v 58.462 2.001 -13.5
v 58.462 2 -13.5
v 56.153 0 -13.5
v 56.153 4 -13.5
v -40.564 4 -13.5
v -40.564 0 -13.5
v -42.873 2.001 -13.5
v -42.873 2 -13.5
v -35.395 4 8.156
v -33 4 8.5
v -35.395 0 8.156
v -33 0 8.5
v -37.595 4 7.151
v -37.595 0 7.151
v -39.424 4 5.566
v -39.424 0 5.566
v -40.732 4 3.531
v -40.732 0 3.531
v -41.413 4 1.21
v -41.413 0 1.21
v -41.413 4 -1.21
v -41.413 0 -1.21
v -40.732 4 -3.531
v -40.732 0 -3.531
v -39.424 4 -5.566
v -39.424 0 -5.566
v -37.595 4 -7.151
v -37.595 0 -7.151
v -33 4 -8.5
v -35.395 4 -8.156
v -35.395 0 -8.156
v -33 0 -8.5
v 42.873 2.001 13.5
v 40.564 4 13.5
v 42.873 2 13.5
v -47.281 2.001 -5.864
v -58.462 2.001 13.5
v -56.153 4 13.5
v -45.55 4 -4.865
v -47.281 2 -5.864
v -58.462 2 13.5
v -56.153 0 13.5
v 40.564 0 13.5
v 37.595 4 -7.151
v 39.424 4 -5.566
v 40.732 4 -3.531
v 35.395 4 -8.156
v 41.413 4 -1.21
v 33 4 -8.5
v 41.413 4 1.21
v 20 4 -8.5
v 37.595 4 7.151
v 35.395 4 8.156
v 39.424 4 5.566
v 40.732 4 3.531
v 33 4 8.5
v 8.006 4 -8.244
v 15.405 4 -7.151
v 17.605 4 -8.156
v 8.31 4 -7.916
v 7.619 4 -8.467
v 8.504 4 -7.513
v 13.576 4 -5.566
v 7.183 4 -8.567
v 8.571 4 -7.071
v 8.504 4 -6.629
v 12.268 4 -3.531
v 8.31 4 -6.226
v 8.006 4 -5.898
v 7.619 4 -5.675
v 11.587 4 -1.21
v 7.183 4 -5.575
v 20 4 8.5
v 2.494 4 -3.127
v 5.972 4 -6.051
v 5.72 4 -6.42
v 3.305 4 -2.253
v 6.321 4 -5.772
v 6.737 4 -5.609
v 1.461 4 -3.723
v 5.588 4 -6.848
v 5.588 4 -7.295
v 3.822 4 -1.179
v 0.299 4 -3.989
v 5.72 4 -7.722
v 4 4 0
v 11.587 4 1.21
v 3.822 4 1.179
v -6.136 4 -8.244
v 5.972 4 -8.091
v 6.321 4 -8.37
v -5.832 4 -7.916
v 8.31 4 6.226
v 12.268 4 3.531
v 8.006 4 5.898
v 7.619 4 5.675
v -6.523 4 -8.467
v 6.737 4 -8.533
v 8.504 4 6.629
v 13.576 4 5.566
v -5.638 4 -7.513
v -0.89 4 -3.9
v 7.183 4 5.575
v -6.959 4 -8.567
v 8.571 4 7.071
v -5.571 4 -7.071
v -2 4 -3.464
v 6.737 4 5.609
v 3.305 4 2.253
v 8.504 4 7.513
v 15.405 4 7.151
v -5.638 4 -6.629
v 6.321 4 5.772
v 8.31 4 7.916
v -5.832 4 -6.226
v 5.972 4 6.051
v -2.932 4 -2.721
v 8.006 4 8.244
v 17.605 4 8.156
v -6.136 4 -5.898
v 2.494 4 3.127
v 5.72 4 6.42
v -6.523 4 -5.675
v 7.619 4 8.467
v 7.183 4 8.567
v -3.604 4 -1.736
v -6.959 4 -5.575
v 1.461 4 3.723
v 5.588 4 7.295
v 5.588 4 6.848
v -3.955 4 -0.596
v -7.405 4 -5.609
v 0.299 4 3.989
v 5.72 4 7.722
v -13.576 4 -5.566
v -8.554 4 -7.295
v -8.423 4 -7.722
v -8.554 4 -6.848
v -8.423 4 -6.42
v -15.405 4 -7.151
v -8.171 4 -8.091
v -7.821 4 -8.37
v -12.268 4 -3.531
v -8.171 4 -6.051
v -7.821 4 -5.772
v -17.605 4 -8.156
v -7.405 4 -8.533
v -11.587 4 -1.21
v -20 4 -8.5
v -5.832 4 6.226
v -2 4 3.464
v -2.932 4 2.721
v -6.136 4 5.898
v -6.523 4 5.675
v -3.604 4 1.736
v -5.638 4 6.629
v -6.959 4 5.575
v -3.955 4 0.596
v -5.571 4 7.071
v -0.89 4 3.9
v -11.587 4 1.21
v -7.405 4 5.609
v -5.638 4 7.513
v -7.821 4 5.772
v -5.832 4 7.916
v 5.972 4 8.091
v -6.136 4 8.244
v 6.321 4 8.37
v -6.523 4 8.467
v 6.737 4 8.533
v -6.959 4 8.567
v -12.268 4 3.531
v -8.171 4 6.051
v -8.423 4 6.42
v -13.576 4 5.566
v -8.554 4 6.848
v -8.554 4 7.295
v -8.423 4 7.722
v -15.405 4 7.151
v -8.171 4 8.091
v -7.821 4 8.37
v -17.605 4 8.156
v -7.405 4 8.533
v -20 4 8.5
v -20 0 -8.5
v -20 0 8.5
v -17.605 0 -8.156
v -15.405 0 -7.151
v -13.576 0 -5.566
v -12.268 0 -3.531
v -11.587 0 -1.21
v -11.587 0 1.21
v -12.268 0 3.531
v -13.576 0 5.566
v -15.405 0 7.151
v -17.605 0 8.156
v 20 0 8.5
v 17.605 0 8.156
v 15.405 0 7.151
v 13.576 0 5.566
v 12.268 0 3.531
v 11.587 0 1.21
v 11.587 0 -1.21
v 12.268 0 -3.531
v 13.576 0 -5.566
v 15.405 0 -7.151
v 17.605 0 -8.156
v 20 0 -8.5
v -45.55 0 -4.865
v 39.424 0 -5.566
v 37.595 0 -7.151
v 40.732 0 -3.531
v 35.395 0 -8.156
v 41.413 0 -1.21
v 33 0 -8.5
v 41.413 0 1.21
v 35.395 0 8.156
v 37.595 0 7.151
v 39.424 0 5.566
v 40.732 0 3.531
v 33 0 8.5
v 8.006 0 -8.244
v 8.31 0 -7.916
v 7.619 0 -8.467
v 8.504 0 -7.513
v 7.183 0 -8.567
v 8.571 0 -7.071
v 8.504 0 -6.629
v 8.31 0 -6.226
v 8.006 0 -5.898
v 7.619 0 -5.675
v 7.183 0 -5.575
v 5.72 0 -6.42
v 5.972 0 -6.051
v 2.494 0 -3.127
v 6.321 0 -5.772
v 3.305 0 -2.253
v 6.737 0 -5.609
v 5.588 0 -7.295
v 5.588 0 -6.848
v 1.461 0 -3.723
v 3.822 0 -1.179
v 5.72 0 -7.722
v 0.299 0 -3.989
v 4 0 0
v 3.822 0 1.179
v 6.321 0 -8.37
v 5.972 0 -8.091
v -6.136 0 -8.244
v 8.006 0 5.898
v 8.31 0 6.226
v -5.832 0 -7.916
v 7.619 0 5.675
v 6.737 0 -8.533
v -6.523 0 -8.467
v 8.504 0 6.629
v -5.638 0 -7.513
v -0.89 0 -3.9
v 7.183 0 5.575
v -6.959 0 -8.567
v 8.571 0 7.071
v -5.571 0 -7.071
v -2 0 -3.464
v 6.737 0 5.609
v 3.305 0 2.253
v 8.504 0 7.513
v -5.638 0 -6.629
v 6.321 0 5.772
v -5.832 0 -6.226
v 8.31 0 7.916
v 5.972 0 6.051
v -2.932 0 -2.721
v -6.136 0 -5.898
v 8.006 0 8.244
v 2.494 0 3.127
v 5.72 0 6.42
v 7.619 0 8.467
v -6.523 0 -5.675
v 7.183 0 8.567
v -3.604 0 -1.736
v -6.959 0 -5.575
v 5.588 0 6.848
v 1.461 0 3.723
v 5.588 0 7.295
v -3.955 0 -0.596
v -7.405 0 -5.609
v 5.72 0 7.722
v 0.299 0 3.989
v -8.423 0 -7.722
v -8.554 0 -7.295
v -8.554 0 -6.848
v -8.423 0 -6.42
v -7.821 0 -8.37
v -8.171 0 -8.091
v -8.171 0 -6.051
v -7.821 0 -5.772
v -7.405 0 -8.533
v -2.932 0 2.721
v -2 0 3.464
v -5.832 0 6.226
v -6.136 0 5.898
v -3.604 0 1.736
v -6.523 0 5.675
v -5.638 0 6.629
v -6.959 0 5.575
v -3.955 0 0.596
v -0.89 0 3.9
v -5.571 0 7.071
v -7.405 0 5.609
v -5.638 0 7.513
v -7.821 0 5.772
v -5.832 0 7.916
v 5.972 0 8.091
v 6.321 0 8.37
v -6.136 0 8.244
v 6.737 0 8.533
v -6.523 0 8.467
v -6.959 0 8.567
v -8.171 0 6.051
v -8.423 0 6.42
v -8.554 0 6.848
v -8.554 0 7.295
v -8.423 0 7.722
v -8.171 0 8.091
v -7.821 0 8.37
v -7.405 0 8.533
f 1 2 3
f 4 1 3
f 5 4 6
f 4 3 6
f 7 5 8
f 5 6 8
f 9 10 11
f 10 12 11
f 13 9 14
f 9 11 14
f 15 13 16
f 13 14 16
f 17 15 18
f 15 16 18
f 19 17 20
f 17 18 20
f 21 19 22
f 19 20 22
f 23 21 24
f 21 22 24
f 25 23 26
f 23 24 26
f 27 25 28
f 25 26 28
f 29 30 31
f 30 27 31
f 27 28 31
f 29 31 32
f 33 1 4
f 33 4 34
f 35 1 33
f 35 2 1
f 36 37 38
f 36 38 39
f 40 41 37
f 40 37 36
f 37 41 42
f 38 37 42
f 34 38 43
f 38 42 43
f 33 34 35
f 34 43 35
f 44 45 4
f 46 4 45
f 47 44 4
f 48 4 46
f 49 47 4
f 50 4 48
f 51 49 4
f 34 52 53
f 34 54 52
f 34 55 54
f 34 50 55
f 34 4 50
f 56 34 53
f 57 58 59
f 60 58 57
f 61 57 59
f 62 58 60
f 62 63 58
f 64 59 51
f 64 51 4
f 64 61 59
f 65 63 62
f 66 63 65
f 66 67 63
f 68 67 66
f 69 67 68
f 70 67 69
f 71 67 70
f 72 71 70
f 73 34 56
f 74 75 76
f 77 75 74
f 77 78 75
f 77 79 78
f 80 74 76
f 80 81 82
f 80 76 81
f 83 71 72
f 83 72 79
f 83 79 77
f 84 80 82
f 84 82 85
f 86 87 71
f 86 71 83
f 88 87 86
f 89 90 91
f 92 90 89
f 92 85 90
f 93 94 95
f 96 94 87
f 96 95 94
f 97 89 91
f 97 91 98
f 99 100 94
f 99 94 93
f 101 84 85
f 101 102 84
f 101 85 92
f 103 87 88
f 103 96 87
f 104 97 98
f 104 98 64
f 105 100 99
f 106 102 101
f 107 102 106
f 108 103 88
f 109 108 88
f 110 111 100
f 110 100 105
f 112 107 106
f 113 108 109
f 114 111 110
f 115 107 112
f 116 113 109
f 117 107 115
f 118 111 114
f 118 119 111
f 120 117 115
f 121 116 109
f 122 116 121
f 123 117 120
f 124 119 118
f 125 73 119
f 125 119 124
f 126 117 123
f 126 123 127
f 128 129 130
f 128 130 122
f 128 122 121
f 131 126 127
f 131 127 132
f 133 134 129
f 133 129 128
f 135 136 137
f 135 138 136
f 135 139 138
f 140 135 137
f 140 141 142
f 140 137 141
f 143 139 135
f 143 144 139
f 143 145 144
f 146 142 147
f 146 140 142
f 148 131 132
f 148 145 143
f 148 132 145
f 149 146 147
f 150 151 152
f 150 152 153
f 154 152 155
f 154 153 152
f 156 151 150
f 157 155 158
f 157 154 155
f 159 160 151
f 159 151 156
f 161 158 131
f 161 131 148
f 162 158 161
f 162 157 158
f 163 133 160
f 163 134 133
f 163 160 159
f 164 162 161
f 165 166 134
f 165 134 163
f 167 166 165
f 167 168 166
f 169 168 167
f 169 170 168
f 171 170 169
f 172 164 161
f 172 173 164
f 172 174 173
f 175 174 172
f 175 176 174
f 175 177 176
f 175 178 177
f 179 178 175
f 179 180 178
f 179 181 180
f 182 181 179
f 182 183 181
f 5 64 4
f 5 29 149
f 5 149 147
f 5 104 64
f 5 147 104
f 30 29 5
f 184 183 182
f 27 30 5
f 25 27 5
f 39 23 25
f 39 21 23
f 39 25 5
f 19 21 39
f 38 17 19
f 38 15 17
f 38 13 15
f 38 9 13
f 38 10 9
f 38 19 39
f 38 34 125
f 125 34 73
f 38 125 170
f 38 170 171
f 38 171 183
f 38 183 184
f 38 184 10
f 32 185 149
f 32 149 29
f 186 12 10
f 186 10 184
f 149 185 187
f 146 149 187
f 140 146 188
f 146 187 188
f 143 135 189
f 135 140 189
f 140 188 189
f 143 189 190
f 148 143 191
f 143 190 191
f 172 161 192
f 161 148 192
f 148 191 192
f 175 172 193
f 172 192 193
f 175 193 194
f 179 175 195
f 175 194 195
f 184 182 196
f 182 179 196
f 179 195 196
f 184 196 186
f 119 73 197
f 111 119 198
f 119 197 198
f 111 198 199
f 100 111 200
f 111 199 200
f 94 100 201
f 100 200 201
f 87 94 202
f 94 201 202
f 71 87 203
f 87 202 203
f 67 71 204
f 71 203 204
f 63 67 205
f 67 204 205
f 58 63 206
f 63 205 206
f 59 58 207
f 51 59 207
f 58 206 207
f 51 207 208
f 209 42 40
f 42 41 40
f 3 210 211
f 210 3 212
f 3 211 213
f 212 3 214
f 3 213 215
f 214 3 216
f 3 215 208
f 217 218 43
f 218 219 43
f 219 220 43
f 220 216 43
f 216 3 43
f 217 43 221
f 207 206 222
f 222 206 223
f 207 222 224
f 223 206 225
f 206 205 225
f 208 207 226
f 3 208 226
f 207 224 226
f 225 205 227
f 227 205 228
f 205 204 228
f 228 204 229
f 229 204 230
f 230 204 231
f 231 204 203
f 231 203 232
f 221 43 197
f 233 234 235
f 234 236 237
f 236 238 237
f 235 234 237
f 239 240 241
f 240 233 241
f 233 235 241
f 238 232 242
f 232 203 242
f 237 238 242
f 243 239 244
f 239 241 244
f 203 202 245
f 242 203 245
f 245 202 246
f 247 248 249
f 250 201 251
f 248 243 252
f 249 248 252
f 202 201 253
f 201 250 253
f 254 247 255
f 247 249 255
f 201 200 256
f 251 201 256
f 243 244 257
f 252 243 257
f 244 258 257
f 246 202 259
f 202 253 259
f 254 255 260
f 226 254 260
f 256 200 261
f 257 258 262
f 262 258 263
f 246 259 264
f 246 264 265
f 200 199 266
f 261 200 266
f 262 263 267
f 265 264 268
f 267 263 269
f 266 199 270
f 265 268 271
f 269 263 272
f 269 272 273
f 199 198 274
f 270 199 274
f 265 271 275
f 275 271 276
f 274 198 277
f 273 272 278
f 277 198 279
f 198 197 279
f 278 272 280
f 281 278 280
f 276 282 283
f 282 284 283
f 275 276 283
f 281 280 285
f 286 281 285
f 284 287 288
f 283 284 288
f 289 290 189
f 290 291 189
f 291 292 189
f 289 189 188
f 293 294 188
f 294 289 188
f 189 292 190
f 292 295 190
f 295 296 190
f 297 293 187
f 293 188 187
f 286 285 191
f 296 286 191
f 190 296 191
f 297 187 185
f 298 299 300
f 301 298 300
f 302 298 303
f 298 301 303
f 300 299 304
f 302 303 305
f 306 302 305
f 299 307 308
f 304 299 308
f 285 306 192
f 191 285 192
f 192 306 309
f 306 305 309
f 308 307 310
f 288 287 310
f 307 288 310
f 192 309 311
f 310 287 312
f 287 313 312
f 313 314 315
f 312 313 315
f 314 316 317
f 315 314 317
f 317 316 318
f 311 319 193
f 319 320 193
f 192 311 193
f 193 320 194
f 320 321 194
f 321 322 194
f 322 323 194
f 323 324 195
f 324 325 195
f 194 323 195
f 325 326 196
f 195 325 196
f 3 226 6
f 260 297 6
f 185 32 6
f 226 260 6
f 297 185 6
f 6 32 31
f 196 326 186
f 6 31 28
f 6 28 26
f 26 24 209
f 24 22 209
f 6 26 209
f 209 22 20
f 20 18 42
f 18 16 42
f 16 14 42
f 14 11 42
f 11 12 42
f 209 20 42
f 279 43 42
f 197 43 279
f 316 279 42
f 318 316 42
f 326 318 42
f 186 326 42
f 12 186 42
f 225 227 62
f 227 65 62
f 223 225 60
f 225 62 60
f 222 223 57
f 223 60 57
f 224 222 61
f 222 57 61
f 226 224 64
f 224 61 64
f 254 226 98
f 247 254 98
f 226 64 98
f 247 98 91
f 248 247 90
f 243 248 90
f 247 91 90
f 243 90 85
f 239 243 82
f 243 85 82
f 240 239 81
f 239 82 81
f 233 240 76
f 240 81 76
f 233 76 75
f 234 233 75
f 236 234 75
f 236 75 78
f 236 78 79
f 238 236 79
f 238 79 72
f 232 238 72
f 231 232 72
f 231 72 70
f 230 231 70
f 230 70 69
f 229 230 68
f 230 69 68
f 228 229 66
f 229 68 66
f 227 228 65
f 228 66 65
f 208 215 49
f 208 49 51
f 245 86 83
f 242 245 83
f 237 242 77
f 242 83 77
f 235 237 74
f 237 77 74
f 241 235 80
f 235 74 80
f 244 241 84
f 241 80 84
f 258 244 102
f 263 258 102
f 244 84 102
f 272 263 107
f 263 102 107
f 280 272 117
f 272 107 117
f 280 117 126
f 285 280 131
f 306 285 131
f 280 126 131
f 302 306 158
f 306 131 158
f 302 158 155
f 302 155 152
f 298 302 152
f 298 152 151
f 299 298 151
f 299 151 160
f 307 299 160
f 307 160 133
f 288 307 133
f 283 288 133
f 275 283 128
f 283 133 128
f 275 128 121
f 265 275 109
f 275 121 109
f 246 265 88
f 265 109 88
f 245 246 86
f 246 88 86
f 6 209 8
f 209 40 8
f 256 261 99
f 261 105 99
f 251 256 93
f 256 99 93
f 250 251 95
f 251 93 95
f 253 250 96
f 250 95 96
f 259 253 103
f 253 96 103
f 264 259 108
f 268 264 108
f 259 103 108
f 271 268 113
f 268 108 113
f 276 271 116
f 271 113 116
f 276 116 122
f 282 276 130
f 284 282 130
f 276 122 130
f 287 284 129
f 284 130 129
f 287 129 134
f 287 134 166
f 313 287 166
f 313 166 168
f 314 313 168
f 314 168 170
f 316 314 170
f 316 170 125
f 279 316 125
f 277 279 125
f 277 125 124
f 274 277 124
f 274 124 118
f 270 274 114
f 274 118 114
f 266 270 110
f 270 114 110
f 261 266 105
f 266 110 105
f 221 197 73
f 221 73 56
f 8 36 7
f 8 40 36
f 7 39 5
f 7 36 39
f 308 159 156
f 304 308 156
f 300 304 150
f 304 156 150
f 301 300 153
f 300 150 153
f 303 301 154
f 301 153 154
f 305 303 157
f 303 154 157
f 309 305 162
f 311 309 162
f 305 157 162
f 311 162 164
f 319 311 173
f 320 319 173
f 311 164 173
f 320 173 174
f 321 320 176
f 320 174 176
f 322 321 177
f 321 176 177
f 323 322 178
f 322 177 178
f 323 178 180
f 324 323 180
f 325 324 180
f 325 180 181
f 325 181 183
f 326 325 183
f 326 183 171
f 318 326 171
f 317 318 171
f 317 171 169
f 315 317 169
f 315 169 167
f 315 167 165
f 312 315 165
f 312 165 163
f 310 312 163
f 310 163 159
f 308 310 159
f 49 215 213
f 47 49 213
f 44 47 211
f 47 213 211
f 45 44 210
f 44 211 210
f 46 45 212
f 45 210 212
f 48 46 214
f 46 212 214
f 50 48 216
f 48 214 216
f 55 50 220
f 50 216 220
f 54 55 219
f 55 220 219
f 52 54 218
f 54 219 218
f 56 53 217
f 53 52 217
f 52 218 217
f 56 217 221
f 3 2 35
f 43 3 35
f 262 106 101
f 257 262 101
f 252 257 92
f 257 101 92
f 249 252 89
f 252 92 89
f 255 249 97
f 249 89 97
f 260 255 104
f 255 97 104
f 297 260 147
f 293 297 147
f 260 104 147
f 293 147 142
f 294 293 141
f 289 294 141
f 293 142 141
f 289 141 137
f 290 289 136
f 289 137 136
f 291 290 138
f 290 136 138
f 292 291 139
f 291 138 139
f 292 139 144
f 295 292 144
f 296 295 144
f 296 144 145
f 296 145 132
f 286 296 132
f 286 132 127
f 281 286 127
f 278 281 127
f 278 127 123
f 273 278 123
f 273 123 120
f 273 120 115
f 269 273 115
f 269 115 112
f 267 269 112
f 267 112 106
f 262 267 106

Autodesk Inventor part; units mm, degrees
ref_plane "YZ Plane" through (0, 0, 0) normal (1, 0, 0) x (0, 1, 0)
ref_plane "XZ Plane" through (0, 0, 0) normal (0, 1, 0) x (-1, 0, 0)
ref_plane "XY Plane" through (0, 0, 0) normal (0, 0, 1) x (1, 0, 0)
sketch "Sketch1" plane through (0, 0, 0) normal (0, 1, 0) x (-1, 0, 0)
  circle A0 centre (0, 0) radius 13.5
  circle A1 centre (0, 0) radius 60
  line L0 (-58.4615, -13.5) -> (58.4615, -13.5)
  line L1 (58.4615, -13.5) -> (58.4615, 13.5)
  line L2 (58.4615, 13.5) -> (-58.4615, 13.5)
  line L3 (-58.4615, 13.5) -> (-58.4615, -13.5)
  line L4 (-58.4615, -13.5) -> (58.4615, 13.5) construction
  line L5 (58.4615, -13.5) -> (-58.4615, 13.5) construction
  line L6 (-20, 0) -> (-33, 0) construction
  line L7 (-20, 8.5) -> (-33, 8.5)
  line L8 (-33, -8.5) -> (-20, -8.5)
  arc A2 (-20, -8.5) -> (-20, 8.5) centre (-20, 0) ccw
  arc A3 (-33, 8.5) -> (-33, -8.5) centre (-33, 0) ccw
  line L9 (-58.4615, -13.5) -> (-42.8731, 13.5)
  line L10 (-58.4615, -13.5) -> (-27.2846, -13.5) construction
  line L11 (33, 0) -> (20, 0) construction
  line L12 (33, 8.5) -> (20, 8.5)
  line L13 (20, -8.5) -> (33, -8.5)
  arc A4 (33, -8.5) -> (33, 8.5) centre (33, 0) ccw
  arc A5 (20, 8.5) -> (20, -8.5) centre (20, 0) ccw
  line L14 (58.4615, 13.5) -> (47.2814, -5.8645)
  line L15 (58.4615, 13.5) -> (80.8217, 13.5) construction
  line L16 (47.2814, -5.8645) -> (42.8731, -13.5)
  point P0 (0, 0)
  point P1 (-0.767, 13.4782)
  point P2 (-9.0908, 9.9804)
  point P3 (0, 0)
  point P4 (-26.5, 0)
  point P5 (26.5, 0)
  point P6 (45.9853, -13.5)
  point P7 (0, 13.5)
  point P8 (0, -13.5)
  point P9 (12.75, -4.4371)
  point P10 (12.75, 4.4371)
  point P11 (-12.75, 4.4371)
  point P12 (-12.75, -4.4371)
  dimension "d7" = 120
  dimension "d1" = 27
  dimension "d9" = 5
  dimension "d10" = 5
  dimension "d11" = 60
  dimension "d12" = 5
  dimension "d13" = 5
  dimension "d14" = 13
  dimension "d15" = 13
  dimension "d16" = 20
  dimension "d17" = 20
  dimension "d24" = 120
extrude "Extrusion1" add sketch "Sketch1" along normal blind 4 contours A5 A0 A2 | A0 L2 L14 L16 L0 A5 L13 A4 L12 | A0 A2 L7 A3 L8 L0 L9 L2
chamfer "Chamfer1" distance 2 angle 45 4 edges at (50.6673, 4, 0) (50.6673, 0, 0) (-52.8715, 0, 3.8177) (-52.8715, 4, 3.8177)
sketch "Sketch2" plane through (0, 4, 0) normal (0, 1, 0) x (1, 0, 0)
  circle A0 centre (0, 0) radius 4
  line L0 (0, 0) -> (7.0711, -7.0711)
  line L1 (0, 0) -> (10, 0) construction
  circle A1 centre (7.0711, -7.0711) radius 1.5
  circle A2 centre (7.0711, 7.0711) radius 1.5
  circle A3 centre (-7.0711, 7.0711) radius 1.5
  circle A4 centre (-7.0711, -7.0711) radius 1.5
  dimension "d21" = 8
  dimension "d31" = 10
  dimension "d32" = 45
  dimension "d33" = 3
  dimension "d36" = 360
extrude "Extrusion2" cut sketch "Sketch2" against normal blind 4
equation "\"d10\" = d9"
equation "\"d12\" = d9"
equation "\"d13\" = d9"
equation "\"d15\" = d14"
equation "\"d17\" = d16"
properties part number "rotorV2"
